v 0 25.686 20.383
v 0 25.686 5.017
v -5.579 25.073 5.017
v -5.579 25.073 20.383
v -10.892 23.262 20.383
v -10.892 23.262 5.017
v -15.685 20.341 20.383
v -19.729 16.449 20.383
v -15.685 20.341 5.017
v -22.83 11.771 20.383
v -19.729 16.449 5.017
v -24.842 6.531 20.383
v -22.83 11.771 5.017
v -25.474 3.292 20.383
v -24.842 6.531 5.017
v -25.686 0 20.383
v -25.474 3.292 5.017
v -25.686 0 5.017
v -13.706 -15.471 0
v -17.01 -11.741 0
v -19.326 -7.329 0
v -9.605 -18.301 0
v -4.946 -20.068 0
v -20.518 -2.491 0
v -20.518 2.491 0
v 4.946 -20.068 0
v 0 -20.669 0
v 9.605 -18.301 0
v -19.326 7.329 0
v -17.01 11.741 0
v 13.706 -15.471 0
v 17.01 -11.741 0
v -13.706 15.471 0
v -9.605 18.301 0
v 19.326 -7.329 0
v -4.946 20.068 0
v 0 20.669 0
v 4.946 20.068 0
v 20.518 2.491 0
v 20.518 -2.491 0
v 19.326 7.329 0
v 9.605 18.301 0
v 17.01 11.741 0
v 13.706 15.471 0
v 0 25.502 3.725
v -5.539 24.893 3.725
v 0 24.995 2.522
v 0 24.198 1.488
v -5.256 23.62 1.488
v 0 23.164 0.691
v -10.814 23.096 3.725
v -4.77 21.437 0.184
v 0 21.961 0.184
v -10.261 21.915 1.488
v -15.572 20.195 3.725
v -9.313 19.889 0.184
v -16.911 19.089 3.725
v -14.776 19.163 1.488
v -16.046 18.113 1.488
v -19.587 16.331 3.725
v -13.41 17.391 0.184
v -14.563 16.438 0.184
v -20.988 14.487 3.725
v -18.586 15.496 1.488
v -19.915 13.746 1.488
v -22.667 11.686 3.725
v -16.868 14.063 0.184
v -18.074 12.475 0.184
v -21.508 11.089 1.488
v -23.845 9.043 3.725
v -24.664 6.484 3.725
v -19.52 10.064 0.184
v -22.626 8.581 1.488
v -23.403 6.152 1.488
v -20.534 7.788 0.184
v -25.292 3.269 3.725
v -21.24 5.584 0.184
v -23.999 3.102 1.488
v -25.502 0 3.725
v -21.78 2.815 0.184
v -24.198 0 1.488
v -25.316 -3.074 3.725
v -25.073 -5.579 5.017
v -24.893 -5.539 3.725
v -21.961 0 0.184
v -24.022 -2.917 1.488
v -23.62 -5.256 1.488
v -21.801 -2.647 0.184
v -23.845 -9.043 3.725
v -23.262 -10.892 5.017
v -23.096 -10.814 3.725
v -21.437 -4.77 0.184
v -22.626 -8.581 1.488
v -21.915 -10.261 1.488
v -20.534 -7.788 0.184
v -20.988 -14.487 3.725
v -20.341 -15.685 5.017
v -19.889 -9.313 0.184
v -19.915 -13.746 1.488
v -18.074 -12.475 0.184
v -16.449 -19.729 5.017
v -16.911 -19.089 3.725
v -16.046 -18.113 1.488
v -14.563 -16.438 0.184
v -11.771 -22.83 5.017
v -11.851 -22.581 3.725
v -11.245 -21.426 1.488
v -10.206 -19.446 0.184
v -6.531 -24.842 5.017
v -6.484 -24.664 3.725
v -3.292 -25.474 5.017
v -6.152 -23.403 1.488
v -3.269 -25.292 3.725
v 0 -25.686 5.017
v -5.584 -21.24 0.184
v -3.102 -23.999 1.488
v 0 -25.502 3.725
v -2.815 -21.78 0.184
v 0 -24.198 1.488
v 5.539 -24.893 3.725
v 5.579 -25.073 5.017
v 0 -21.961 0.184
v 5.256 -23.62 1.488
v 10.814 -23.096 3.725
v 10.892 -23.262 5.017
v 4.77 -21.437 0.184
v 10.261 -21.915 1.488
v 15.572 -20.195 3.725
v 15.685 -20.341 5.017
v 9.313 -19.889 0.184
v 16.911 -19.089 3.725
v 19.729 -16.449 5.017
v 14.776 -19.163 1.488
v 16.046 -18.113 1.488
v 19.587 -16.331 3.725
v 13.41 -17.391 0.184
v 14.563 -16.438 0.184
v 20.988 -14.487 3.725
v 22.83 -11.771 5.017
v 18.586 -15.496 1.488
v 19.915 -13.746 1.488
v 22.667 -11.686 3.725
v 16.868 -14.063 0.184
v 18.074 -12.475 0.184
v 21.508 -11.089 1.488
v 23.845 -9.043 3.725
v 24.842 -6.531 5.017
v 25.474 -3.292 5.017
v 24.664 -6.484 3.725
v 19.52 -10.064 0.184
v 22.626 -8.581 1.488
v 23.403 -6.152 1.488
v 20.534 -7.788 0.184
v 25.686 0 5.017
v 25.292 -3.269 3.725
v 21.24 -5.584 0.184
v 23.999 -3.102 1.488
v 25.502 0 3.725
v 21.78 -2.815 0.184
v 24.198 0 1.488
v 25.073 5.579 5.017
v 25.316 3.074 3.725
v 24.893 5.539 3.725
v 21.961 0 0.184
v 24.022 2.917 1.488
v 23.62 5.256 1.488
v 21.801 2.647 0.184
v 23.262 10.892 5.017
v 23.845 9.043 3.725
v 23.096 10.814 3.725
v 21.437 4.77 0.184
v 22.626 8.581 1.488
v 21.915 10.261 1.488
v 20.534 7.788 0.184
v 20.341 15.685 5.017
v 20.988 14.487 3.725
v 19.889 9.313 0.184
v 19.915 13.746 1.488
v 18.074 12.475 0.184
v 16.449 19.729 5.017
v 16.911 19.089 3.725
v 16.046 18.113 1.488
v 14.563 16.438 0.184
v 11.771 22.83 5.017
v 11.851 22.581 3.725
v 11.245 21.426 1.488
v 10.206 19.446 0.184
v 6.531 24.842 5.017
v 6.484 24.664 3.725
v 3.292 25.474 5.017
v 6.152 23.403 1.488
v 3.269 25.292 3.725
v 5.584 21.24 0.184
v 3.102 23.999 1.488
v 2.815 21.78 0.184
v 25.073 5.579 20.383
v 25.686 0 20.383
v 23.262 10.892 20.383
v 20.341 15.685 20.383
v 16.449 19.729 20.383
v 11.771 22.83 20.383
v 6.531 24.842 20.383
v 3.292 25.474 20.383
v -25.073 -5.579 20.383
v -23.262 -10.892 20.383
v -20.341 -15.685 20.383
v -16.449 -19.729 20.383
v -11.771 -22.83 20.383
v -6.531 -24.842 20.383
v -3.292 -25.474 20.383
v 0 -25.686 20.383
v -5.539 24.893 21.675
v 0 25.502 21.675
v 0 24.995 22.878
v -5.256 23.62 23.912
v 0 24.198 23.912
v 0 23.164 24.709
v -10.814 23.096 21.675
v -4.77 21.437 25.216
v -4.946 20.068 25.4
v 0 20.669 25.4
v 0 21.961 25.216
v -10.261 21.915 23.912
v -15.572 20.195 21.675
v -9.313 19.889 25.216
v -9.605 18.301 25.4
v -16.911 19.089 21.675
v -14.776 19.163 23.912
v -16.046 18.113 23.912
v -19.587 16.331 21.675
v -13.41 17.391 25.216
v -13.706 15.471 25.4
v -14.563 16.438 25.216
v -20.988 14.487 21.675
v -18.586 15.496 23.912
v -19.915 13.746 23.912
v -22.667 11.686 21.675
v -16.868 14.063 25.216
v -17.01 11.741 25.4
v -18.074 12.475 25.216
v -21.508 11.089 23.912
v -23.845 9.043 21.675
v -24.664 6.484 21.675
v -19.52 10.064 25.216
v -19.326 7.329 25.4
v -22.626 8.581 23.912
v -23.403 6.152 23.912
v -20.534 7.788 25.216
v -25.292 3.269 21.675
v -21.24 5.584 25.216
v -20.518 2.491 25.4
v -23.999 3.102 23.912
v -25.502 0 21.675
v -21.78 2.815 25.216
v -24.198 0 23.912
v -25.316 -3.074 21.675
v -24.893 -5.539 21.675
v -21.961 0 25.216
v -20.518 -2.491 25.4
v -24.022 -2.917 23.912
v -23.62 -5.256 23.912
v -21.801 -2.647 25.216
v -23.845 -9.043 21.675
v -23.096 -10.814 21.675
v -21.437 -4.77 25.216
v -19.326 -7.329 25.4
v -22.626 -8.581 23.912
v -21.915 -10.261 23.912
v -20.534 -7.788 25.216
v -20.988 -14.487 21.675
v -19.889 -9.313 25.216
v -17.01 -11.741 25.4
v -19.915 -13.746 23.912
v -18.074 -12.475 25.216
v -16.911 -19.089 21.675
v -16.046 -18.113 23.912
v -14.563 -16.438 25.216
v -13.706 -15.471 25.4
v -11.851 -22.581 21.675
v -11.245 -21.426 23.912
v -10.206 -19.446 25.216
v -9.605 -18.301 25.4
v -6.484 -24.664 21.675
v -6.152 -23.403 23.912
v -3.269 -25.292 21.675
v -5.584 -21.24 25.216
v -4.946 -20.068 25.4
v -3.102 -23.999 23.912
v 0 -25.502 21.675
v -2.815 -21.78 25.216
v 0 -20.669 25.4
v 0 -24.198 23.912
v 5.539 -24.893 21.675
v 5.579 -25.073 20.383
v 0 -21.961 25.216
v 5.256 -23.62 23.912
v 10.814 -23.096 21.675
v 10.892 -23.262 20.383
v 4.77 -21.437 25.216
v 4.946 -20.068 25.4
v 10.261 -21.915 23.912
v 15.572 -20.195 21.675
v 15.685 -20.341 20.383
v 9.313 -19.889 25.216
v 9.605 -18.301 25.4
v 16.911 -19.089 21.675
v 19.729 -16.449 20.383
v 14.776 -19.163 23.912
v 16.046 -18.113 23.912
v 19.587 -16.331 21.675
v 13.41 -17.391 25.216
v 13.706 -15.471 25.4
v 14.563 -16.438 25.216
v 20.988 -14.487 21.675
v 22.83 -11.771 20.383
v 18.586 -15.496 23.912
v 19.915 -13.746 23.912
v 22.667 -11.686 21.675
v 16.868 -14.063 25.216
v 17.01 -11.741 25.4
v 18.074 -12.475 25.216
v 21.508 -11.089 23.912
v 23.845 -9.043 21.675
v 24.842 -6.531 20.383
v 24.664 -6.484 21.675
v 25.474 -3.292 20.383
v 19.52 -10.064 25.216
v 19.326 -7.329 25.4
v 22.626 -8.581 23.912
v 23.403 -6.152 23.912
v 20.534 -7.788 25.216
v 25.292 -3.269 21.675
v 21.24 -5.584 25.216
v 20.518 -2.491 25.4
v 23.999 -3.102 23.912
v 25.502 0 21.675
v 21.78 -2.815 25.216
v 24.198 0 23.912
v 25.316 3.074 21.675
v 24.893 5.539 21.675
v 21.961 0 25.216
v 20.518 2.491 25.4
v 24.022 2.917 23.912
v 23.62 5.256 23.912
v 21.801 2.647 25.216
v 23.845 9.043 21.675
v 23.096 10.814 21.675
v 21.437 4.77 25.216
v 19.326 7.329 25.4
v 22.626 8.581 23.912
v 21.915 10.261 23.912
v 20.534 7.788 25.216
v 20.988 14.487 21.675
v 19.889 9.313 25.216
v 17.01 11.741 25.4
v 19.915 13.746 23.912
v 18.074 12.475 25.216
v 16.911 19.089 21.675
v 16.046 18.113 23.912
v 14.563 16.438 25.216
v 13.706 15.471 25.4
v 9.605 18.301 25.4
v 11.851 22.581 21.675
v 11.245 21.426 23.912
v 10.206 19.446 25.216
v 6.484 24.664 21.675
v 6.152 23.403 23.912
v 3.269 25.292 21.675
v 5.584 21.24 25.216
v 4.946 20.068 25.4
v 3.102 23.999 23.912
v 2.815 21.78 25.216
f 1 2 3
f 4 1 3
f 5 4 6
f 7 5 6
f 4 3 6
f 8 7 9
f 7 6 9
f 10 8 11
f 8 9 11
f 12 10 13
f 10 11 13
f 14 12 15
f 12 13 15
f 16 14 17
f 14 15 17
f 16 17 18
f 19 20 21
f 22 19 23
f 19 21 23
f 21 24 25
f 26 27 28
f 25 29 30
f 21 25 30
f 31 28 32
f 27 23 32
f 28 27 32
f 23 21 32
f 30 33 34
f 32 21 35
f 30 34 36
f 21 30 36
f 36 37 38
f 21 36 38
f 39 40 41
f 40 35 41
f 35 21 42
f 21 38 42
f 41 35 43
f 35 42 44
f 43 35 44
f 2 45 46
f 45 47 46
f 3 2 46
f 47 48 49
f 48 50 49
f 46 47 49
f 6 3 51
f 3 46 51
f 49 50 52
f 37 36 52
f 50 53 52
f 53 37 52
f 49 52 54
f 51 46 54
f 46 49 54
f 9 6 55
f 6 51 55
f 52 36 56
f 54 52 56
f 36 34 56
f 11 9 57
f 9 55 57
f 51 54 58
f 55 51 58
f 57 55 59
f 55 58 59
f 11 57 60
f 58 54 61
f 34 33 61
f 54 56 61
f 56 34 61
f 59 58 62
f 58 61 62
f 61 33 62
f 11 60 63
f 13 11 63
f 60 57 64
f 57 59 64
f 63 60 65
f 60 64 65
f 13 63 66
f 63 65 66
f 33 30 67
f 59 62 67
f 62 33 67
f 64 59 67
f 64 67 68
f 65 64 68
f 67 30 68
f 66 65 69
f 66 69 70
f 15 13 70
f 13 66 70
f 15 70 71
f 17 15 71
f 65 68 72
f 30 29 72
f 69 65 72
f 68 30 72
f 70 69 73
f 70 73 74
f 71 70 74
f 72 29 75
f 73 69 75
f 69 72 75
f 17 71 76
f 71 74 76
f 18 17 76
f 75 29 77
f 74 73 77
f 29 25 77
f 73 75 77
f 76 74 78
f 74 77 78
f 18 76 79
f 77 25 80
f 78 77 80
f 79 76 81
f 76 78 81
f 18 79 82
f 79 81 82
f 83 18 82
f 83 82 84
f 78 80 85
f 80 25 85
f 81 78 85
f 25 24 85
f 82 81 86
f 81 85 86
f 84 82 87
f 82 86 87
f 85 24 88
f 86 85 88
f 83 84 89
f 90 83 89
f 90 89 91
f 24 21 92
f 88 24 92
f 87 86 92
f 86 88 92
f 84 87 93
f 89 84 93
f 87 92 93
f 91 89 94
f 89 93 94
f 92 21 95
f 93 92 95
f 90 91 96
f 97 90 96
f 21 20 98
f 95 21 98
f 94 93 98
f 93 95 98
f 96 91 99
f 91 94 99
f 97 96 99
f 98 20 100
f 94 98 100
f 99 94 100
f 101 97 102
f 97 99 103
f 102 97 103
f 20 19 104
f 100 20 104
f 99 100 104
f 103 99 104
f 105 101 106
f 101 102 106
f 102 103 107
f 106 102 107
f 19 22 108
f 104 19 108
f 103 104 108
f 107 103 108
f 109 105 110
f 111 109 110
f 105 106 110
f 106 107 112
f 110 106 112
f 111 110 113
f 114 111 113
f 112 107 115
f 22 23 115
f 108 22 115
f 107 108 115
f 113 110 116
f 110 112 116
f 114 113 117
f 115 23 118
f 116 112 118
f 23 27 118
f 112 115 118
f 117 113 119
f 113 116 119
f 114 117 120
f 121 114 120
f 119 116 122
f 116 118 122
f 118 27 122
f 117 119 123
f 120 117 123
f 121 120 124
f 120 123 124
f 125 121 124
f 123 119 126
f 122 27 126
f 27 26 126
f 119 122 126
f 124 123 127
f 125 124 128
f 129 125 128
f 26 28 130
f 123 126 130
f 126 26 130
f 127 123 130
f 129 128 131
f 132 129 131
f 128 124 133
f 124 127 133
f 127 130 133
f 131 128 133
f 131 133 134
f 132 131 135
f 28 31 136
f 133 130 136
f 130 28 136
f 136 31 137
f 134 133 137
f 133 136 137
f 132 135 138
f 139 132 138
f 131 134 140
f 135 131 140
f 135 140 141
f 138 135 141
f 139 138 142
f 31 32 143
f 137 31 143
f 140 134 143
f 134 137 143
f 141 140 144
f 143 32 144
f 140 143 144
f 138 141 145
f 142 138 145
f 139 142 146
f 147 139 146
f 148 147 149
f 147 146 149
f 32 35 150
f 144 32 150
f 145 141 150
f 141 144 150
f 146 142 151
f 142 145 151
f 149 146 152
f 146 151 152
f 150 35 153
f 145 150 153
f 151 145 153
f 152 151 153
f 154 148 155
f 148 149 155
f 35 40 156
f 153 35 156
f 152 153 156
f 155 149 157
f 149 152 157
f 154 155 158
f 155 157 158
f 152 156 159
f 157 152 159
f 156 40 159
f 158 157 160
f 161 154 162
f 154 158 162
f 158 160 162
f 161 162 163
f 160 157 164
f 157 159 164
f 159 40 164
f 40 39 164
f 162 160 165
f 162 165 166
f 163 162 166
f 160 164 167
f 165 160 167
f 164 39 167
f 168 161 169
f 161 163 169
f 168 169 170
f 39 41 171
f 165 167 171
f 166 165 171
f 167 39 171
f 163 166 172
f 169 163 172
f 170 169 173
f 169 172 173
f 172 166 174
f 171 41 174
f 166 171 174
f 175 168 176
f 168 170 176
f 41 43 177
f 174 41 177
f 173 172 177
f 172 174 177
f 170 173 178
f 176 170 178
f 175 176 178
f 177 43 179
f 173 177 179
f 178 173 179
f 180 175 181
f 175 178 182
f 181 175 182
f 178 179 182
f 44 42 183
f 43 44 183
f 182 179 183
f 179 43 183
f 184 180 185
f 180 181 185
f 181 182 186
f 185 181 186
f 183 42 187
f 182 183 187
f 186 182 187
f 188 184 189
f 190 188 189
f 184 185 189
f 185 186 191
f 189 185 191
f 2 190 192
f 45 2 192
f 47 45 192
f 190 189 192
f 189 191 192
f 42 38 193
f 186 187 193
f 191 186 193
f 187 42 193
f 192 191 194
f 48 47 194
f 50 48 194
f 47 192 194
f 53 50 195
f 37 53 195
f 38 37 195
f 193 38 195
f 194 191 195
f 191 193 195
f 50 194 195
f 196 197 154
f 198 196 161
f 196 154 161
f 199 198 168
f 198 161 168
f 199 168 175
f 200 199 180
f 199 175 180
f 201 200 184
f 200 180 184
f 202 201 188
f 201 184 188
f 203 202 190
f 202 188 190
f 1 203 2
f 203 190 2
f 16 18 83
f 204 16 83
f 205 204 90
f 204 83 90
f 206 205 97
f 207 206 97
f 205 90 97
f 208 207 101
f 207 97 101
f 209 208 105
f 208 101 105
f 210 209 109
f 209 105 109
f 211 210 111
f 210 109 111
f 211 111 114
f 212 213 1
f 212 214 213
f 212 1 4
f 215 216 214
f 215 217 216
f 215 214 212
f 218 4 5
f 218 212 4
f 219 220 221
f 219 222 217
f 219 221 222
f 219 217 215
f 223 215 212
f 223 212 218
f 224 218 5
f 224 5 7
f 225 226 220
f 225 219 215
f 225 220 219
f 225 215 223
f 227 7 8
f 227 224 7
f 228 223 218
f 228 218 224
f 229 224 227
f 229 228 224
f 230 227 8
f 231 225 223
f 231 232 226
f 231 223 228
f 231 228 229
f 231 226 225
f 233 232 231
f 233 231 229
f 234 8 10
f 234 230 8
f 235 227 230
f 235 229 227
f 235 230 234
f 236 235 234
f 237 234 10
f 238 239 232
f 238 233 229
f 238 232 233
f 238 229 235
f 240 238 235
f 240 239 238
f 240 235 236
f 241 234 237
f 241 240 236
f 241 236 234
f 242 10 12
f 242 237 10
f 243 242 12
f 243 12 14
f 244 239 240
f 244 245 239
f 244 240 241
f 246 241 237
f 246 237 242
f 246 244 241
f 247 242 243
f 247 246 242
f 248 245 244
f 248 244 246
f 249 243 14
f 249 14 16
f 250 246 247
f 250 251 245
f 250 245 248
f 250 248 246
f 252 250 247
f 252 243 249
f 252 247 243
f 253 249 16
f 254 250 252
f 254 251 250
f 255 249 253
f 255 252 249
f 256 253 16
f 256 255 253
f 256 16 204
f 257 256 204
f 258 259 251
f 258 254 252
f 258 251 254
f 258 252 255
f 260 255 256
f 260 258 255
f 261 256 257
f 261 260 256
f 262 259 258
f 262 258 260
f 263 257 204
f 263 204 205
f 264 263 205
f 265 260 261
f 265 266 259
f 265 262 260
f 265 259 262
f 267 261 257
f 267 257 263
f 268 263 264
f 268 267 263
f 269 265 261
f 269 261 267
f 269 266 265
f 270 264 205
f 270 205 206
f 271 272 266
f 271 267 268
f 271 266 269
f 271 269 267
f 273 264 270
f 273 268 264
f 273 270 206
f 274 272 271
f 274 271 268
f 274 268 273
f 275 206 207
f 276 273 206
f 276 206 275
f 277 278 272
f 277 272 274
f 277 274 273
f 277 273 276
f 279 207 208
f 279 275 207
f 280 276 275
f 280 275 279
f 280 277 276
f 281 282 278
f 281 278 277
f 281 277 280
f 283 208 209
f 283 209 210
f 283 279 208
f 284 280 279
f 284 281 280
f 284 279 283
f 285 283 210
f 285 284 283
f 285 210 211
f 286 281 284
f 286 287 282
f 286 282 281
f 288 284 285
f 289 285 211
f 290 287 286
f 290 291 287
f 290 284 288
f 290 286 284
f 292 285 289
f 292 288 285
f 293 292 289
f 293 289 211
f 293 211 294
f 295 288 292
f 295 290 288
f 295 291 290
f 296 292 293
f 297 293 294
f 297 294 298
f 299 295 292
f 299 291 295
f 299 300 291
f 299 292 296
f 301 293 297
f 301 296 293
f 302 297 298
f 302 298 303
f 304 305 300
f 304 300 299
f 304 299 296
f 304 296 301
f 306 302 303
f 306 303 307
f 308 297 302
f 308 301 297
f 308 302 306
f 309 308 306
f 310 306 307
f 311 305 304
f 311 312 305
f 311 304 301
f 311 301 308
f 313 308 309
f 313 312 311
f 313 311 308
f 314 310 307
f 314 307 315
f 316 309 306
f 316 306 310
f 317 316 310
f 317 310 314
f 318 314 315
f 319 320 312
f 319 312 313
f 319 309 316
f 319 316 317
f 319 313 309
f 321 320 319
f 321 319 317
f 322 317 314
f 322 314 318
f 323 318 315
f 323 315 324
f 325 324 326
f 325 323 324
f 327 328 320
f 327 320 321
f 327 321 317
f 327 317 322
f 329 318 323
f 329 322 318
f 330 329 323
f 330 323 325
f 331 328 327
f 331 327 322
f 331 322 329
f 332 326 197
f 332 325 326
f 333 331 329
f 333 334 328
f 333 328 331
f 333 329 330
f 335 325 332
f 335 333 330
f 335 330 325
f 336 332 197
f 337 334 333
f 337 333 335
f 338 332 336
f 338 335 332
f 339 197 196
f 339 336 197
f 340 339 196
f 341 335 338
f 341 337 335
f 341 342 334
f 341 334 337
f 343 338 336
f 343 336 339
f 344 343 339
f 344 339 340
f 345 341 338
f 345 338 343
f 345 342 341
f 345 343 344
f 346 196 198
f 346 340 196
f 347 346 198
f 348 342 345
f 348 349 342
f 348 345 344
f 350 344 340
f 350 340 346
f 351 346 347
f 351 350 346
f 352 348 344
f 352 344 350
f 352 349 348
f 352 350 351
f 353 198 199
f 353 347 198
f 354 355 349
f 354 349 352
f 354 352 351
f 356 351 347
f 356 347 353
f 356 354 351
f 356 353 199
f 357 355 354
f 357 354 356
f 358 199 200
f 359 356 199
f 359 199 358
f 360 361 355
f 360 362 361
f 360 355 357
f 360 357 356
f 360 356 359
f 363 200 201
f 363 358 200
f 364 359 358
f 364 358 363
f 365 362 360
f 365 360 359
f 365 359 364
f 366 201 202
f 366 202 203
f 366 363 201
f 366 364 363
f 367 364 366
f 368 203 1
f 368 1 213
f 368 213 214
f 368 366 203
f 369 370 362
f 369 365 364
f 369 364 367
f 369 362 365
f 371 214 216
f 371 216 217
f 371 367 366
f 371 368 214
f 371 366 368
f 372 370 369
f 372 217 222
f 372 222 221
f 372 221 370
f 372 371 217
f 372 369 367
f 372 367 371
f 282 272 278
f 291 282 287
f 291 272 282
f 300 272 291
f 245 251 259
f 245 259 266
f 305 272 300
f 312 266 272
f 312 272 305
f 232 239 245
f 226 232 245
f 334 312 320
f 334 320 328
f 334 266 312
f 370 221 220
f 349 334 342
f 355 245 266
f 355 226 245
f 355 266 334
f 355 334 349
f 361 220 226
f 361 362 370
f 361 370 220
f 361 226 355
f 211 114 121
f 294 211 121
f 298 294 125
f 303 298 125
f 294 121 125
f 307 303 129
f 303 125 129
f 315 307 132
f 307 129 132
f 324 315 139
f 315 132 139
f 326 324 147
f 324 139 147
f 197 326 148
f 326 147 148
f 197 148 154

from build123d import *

# Parameters (mm, degrees)
F1_DEPTH = 25.4


# Not quite as in the source:
# - a fillet or chamfer that OpenCascade refuses, or shapes differently, is made with other operations: its cross-section is extruded or revolved along the edge and cut away or added


with BuildPart() as f1:
    # F0 (on Top) → F1 (new body)
    with BuildSketch(Plane.XY):
        with BuildLine():
            Line((0, 0), (25.6860326238, 0))
            ThreePointArc((25.6860326238, 0), (18.1627678501, 18.1627678501), (0, 25.6860326238))
            Line((0, 25.6860326238), (0, 0))
        make_face()
        with BuildLine():
            ThreePointArc((0, -25.6860326238), (18.1627678501, -18.1627678501), (25.6860326238, 0))
            Line((25.6860326238, 0), (0, 0))
            Line((0, 0), (0, -25.6860326238))
        make_face()
        with BuildLine():
            ThreePointArc((-25.6860326238, 0), (-18.1627678501, -18.1627678501), (0, -25.6860326238))
            Line((0, -25.6860326238), (0, 0))
            Line((0, 0), (-25.6860326238, 0))
        make_face()
        with BuildLine():
            Line((0, 0), (0, 25.6860326238))
            ThreePointArc((0, 25.6860326238), (-18.1627678501, 18.1627678501), (-25.6860326238, 0))
            Line((-25.6860326238, 0), (0, 0))
        make_face()
    extrude(amount=F1_DEPTH)

    # F2: fillet of radius 5.08 on 3 edges, made by hand

    # F2_s1 → F2_t2 (revolve, cut)
    with BuildSketch(Plane.YZ):
        with BuildLine():
            ThreePointArc((25.6864326238, 20.3190343146), (24.1981350723, 23.9121024484), (20.6050669384, 25.4004))
            Line((20.6050669384, 25.4004), (20.6050669384, 25.9085365685))
            ThreePointArc((20.6050669384, 25.9085365685), (23.1455497811, 25.9081365685), (25.6860326238, 25.9081365685))
            Line((25.6860326238, 25.9081365685), (26.1941691924, 25.4))
            ThreePointArc((26.1941691924, 25.4), (26.1941691924, 22.8595171573), (26.1945691924, 20.3190343146))
            Line((26.1945691924, 20.3190343146), (25.6864326238, 20.3190343146))
        make_face()
    revolve(axis=Axis((0, 0, 25.4), (0, 0, 1)), mode=Mode.SUBTRACT)

    # F2_s3 → F2_t4 (revolve, cut)
    with BuildSketch(Plane.YZ):
        with BuildLine():
            ThreePointArc((25.6864326238, 5.0809656854), (24.1981350723, 1.4878975516), (20.6050669384, -0.0004))
            Line((20.6050669384, -0.0004), (20.6050669384, -0.5085365685))
            ThreePointArc((20.6050669384, -0.5085365685), (23.1455497811, -0.5081365685), (25.6860326238, -0.5081365685))
            Line((25.6860326238, -0.5081365685), (26.1941691924, 0))
            ThreePointArc((26.1941691924, 0), (26.1941691924, 2.5404828427), (26.1945691924, 5.0809656854))
            Line((26.1945691924, 5.0809656854), (25.6864326238, 5.0809656854))
        make_face()
    revolve(axis=Axis((0, 0, 0), (0, 0, 1)), mode=Mode.SUBTRACT)


solid = f1.part
